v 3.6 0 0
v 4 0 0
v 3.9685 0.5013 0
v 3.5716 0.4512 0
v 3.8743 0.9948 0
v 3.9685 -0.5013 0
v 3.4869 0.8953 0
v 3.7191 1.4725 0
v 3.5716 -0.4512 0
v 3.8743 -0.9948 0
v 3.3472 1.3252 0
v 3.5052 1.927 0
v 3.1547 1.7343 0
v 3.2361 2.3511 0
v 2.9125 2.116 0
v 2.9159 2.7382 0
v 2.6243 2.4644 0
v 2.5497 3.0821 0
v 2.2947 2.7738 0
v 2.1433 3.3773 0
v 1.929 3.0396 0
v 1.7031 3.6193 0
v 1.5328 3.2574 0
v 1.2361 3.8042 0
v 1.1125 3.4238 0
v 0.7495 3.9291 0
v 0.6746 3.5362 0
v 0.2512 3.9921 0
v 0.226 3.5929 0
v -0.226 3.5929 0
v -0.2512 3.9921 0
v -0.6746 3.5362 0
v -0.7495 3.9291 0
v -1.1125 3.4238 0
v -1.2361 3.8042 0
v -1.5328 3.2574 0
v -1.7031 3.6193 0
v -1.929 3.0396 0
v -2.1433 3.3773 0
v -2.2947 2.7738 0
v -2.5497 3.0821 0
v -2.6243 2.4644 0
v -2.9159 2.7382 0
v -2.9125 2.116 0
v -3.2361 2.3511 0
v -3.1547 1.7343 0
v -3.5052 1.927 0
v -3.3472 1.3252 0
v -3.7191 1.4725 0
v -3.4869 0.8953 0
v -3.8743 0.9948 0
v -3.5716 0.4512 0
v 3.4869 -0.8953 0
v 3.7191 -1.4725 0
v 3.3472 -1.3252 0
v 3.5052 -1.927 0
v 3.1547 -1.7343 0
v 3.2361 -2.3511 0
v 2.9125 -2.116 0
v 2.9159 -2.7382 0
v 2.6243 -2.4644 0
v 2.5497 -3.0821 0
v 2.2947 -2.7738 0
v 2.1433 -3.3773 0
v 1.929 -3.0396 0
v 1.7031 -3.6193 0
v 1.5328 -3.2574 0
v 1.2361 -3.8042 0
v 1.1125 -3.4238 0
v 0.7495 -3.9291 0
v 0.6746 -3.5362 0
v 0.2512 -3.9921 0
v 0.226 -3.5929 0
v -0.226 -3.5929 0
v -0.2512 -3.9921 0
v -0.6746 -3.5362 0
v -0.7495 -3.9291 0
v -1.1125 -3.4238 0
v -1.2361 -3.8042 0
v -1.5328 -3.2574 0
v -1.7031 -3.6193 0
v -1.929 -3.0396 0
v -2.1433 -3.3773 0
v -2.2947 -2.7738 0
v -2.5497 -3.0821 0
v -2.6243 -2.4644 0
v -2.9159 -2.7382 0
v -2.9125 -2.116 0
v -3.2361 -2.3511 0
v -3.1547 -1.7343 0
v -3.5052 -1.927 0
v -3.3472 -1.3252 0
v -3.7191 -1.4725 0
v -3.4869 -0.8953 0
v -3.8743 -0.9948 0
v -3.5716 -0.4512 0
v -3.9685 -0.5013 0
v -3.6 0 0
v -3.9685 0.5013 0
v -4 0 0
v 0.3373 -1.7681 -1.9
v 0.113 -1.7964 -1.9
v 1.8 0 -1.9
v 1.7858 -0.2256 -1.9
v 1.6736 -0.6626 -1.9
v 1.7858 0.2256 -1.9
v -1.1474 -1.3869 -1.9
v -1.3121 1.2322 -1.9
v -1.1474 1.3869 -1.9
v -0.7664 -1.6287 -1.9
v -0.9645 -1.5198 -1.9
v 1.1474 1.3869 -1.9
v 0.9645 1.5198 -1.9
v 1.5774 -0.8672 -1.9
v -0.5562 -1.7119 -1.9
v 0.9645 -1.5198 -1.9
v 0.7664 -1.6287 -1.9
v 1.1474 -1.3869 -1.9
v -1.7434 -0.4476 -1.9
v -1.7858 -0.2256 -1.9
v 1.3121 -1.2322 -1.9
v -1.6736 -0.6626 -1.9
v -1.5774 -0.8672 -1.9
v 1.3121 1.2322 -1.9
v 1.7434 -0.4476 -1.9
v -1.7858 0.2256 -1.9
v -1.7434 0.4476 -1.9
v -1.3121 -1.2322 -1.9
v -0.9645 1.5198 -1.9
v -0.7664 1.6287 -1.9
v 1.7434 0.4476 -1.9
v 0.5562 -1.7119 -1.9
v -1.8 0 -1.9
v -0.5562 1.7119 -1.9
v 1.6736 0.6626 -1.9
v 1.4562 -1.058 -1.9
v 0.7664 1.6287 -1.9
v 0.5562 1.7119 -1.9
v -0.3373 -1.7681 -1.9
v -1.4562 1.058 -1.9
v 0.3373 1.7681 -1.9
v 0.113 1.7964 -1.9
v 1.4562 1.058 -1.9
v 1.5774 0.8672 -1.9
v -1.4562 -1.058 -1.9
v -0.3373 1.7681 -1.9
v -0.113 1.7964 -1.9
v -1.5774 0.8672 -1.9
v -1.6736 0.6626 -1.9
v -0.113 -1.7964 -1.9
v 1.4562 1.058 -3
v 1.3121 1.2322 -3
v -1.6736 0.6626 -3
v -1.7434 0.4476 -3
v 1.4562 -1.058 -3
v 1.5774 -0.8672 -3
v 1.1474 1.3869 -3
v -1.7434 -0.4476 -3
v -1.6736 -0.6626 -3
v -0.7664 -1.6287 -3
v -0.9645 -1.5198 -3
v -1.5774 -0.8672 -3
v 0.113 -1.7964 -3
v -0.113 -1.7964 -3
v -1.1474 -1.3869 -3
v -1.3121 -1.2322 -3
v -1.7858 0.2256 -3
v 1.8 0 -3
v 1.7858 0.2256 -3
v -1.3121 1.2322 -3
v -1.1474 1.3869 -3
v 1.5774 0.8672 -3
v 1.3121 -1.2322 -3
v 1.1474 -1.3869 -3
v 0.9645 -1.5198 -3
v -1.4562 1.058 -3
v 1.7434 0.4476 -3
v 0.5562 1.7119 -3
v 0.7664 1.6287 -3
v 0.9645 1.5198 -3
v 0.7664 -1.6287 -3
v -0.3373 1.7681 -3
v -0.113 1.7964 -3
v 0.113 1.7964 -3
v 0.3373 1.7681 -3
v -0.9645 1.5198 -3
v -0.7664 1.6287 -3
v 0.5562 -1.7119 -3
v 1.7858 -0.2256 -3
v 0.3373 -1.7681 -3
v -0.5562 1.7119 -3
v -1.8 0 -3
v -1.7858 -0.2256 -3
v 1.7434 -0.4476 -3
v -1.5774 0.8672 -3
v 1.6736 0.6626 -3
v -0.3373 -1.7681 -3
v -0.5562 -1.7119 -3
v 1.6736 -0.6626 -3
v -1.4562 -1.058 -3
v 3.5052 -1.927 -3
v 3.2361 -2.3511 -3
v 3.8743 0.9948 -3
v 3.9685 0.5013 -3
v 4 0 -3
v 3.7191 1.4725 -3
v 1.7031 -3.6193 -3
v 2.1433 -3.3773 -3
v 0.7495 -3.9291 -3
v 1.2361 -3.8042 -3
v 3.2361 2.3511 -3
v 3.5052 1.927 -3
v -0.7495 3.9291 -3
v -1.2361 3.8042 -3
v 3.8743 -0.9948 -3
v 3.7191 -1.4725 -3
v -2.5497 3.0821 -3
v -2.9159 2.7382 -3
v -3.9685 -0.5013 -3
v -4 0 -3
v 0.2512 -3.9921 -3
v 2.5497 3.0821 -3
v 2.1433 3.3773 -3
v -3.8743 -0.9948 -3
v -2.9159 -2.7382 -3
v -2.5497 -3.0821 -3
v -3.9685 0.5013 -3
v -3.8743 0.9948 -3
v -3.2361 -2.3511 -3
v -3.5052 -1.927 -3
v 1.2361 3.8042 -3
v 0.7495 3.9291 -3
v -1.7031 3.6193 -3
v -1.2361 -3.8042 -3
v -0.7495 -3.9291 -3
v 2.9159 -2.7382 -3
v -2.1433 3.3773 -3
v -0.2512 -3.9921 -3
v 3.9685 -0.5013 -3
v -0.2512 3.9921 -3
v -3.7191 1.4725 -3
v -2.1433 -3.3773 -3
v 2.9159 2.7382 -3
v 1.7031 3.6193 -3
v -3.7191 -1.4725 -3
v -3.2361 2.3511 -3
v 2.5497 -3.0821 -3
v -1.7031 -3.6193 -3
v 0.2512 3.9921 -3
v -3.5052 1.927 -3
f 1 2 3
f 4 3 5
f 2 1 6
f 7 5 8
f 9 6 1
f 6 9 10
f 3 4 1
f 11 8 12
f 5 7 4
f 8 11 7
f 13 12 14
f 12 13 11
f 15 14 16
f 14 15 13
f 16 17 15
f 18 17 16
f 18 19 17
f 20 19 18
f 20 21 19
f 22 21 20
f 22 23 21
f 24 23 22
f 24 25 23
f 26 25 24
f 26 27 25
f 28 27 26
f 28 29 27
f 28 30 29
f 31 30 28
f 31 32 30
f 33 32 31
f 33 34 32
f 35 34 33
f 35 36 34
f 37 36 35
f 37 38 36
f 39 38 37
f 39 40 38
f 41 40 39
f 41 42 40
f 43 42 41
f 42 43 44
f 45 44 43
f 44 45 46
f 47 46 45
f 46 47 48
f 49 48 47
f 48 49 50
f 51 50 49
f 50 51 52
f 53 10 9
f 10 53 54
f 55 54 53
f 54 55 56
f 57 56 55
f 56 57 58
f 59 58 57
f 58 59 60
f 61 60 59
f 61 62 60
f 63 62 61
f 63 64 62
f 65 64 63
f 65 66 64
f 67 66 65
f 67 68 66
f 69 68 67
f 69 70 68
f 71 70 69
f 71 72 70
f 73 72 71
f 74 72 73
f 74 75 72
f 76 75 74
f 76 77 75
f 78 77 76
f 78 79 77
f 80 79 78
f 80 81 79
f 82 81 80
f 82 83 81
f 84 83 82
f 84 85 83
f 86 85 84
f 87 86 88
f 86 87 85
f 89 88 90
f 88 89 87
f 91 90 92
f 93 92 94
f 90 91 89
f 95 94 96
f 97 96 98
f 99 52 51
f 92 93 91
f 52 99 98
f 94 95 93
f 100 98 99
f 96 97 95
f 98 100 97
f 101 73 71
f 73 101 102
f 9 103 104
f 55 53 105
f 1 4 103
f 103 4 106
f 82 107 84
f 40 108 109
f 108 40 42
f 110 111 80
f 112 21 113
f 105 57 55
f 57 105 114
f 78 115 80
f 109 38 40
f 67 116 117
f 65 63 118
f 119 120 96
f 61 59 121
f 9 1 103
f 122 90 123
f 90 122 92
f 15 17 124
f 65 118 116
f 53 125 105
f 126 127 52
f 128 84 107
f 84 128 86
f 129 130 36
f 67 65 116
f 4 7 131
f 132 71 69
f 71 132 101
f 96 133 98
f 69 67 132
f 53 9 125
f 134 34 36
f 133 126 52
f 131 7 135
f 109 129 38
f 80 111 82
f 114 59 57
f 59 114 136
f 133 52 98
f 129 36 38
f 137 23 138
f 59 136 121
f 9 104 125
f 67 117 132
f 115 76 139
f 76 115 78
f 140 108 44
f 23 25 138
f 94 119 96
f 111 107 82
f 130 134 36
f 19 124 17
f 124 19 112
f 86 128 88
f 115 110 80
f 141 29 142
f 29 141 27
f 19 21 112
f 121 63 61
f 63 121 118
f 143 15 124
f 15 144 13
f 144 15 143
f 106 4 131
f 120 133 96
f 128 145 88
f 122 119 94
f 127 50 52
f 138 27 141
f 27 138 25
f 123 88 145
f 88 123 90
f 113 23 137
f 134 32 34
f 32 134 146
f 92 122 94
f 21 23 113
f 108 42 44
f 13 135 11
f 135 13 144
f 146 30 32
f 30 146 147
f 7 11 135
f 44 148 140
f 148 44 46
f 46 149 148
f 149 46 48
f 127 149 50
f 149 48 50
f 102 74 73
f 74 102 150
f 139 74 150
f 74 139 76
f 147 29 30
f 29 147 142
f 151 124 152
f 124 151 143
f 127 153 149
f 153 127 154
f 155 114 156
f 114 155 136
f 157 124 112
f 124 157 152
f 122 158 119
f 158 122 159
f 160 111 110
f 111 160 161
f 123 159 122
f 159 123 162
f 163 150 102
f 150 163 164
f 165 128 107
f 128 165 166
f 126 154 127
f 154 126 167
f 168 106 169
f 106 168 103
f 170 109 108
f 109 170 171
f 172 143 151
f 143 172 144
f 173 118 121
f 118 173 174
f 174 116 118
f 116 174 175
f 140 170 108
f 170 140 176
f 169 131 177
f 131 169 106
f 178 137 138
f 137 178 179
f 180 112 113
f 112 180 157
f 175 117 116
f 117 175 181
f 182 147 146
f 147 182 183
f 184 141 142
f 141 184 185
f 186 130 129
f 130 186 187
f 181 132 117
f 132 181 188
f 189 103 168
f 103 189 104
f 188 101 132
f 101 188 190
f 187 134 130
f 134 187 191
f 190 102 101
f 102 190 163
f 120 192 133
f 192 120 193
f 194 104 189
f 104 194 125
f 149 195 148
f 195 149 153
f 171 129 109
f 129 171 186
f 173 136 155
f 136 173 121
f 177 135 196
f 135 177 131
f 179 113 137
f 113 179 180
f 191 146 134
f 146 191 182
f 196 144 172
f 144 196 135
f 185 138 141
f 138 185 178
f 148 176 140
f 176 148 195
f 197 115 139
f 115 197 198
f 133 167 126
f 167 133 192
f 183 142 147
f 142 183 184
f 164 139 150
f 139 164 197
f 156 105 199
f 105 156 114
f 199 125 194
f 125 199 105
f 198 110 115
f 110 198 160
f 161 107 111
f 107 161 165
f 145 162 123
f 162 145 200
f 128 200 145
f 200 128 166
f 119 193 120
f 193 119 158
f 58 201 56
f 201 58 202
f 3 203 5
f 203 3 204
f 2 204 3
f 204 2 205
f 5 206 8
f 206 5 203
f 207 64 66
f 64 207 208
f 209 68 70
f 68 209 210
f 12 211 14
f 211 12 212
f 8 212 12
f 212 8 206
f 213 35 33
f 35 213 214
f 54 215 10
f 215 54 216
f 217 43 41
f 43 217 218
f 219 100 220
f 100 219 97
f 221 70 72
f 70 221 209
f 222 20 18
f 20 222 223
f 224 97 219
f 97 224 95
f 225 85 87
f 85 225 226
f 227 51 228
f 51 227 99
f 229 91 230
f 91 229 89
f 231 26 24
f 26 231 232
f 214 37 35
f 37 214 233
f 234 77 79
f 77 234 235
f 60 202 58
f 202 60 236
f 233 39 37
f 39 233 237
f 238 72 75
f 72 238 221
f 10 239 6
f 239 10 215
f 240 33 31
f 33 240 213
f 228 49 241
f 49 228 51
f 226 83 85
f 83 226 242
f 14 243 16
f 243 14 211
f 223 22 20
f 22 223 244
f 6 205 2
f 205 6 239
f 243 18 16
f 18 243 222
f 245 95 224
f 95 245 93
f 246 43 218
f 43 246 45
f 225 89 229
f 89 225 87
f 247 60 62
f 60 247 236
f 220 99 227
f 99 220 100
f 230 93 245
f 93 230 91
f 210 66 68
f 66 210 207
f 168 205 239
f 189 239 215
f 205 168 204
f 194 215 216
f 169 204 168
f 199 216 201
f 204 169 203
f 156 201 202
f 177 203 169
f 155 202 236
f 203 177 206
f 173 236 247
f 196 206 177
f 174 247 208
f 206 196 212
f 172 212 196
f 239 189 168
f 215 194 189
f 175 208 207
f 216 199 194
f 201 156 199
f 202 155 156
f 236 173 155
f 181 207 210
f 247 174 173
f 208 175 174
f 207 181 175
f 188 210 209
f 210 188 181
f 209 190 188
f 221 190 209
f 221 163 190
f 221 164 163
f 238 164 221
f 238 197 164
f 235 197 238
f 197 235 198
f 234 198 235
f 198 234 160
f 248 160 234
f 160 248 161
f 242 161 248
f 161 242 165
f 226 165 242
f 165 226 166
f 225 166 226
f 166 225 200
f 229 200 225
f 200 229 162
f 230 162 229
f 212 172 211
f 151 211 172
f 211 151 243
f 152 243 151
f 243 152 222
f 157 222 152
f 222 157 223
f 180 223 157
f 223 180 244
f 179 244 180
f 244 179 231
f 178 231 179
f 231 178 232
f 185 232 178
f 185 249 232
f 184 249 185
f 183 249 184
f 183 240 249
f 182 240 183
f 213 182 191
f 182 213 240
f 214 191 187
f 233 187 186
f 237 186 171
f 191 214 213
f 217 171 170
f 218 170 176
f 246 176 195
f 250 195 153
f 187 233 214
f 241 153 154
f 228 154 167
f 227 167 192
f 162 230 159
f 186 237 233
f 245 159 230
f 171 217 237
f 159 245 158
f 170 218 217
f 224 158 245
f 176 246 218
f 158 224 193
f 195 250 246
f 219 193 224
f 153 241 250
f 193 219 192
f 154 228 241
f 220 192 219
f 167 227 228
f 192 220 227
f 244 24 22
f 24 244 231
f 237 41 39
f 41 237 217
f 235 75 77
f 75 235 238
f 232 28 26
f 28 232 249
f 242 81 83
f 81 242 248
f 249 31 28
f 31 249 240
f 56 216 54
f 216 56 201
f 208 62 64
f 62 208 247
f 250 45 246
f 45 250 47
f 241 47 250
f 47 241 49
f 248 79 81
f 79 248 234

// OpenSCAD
$fn = 50;

difference() {
	union() {
		translate(v = [0, 0, -3.0]) {
			cylinder(h = 3, r = 4.0);
		}
	}
	union() {
		translate(v = [0, 0, 0]) {
			rotate(a = [0, 0, 0]) {
				difference() {
					union() {
						translate(v = [0, 0, -6.0]) {
							cylinder(h = 6, r = 1.5);
						}
						translate(v = [0, 0, -1.9]) {
							cylinder(h = 1.9, r1 = 1.8, r2 = 3.6);
						}
						translate(v = [0, 0, -6.0]) {
							cylinder(h = 6, r = 1.8);
						}
						translate(v = [0, 0, -6.0]) {
							cylinder(h = 6, r = 1.5);
						}
					}
					union();
				}
			}
		}
	}
}
